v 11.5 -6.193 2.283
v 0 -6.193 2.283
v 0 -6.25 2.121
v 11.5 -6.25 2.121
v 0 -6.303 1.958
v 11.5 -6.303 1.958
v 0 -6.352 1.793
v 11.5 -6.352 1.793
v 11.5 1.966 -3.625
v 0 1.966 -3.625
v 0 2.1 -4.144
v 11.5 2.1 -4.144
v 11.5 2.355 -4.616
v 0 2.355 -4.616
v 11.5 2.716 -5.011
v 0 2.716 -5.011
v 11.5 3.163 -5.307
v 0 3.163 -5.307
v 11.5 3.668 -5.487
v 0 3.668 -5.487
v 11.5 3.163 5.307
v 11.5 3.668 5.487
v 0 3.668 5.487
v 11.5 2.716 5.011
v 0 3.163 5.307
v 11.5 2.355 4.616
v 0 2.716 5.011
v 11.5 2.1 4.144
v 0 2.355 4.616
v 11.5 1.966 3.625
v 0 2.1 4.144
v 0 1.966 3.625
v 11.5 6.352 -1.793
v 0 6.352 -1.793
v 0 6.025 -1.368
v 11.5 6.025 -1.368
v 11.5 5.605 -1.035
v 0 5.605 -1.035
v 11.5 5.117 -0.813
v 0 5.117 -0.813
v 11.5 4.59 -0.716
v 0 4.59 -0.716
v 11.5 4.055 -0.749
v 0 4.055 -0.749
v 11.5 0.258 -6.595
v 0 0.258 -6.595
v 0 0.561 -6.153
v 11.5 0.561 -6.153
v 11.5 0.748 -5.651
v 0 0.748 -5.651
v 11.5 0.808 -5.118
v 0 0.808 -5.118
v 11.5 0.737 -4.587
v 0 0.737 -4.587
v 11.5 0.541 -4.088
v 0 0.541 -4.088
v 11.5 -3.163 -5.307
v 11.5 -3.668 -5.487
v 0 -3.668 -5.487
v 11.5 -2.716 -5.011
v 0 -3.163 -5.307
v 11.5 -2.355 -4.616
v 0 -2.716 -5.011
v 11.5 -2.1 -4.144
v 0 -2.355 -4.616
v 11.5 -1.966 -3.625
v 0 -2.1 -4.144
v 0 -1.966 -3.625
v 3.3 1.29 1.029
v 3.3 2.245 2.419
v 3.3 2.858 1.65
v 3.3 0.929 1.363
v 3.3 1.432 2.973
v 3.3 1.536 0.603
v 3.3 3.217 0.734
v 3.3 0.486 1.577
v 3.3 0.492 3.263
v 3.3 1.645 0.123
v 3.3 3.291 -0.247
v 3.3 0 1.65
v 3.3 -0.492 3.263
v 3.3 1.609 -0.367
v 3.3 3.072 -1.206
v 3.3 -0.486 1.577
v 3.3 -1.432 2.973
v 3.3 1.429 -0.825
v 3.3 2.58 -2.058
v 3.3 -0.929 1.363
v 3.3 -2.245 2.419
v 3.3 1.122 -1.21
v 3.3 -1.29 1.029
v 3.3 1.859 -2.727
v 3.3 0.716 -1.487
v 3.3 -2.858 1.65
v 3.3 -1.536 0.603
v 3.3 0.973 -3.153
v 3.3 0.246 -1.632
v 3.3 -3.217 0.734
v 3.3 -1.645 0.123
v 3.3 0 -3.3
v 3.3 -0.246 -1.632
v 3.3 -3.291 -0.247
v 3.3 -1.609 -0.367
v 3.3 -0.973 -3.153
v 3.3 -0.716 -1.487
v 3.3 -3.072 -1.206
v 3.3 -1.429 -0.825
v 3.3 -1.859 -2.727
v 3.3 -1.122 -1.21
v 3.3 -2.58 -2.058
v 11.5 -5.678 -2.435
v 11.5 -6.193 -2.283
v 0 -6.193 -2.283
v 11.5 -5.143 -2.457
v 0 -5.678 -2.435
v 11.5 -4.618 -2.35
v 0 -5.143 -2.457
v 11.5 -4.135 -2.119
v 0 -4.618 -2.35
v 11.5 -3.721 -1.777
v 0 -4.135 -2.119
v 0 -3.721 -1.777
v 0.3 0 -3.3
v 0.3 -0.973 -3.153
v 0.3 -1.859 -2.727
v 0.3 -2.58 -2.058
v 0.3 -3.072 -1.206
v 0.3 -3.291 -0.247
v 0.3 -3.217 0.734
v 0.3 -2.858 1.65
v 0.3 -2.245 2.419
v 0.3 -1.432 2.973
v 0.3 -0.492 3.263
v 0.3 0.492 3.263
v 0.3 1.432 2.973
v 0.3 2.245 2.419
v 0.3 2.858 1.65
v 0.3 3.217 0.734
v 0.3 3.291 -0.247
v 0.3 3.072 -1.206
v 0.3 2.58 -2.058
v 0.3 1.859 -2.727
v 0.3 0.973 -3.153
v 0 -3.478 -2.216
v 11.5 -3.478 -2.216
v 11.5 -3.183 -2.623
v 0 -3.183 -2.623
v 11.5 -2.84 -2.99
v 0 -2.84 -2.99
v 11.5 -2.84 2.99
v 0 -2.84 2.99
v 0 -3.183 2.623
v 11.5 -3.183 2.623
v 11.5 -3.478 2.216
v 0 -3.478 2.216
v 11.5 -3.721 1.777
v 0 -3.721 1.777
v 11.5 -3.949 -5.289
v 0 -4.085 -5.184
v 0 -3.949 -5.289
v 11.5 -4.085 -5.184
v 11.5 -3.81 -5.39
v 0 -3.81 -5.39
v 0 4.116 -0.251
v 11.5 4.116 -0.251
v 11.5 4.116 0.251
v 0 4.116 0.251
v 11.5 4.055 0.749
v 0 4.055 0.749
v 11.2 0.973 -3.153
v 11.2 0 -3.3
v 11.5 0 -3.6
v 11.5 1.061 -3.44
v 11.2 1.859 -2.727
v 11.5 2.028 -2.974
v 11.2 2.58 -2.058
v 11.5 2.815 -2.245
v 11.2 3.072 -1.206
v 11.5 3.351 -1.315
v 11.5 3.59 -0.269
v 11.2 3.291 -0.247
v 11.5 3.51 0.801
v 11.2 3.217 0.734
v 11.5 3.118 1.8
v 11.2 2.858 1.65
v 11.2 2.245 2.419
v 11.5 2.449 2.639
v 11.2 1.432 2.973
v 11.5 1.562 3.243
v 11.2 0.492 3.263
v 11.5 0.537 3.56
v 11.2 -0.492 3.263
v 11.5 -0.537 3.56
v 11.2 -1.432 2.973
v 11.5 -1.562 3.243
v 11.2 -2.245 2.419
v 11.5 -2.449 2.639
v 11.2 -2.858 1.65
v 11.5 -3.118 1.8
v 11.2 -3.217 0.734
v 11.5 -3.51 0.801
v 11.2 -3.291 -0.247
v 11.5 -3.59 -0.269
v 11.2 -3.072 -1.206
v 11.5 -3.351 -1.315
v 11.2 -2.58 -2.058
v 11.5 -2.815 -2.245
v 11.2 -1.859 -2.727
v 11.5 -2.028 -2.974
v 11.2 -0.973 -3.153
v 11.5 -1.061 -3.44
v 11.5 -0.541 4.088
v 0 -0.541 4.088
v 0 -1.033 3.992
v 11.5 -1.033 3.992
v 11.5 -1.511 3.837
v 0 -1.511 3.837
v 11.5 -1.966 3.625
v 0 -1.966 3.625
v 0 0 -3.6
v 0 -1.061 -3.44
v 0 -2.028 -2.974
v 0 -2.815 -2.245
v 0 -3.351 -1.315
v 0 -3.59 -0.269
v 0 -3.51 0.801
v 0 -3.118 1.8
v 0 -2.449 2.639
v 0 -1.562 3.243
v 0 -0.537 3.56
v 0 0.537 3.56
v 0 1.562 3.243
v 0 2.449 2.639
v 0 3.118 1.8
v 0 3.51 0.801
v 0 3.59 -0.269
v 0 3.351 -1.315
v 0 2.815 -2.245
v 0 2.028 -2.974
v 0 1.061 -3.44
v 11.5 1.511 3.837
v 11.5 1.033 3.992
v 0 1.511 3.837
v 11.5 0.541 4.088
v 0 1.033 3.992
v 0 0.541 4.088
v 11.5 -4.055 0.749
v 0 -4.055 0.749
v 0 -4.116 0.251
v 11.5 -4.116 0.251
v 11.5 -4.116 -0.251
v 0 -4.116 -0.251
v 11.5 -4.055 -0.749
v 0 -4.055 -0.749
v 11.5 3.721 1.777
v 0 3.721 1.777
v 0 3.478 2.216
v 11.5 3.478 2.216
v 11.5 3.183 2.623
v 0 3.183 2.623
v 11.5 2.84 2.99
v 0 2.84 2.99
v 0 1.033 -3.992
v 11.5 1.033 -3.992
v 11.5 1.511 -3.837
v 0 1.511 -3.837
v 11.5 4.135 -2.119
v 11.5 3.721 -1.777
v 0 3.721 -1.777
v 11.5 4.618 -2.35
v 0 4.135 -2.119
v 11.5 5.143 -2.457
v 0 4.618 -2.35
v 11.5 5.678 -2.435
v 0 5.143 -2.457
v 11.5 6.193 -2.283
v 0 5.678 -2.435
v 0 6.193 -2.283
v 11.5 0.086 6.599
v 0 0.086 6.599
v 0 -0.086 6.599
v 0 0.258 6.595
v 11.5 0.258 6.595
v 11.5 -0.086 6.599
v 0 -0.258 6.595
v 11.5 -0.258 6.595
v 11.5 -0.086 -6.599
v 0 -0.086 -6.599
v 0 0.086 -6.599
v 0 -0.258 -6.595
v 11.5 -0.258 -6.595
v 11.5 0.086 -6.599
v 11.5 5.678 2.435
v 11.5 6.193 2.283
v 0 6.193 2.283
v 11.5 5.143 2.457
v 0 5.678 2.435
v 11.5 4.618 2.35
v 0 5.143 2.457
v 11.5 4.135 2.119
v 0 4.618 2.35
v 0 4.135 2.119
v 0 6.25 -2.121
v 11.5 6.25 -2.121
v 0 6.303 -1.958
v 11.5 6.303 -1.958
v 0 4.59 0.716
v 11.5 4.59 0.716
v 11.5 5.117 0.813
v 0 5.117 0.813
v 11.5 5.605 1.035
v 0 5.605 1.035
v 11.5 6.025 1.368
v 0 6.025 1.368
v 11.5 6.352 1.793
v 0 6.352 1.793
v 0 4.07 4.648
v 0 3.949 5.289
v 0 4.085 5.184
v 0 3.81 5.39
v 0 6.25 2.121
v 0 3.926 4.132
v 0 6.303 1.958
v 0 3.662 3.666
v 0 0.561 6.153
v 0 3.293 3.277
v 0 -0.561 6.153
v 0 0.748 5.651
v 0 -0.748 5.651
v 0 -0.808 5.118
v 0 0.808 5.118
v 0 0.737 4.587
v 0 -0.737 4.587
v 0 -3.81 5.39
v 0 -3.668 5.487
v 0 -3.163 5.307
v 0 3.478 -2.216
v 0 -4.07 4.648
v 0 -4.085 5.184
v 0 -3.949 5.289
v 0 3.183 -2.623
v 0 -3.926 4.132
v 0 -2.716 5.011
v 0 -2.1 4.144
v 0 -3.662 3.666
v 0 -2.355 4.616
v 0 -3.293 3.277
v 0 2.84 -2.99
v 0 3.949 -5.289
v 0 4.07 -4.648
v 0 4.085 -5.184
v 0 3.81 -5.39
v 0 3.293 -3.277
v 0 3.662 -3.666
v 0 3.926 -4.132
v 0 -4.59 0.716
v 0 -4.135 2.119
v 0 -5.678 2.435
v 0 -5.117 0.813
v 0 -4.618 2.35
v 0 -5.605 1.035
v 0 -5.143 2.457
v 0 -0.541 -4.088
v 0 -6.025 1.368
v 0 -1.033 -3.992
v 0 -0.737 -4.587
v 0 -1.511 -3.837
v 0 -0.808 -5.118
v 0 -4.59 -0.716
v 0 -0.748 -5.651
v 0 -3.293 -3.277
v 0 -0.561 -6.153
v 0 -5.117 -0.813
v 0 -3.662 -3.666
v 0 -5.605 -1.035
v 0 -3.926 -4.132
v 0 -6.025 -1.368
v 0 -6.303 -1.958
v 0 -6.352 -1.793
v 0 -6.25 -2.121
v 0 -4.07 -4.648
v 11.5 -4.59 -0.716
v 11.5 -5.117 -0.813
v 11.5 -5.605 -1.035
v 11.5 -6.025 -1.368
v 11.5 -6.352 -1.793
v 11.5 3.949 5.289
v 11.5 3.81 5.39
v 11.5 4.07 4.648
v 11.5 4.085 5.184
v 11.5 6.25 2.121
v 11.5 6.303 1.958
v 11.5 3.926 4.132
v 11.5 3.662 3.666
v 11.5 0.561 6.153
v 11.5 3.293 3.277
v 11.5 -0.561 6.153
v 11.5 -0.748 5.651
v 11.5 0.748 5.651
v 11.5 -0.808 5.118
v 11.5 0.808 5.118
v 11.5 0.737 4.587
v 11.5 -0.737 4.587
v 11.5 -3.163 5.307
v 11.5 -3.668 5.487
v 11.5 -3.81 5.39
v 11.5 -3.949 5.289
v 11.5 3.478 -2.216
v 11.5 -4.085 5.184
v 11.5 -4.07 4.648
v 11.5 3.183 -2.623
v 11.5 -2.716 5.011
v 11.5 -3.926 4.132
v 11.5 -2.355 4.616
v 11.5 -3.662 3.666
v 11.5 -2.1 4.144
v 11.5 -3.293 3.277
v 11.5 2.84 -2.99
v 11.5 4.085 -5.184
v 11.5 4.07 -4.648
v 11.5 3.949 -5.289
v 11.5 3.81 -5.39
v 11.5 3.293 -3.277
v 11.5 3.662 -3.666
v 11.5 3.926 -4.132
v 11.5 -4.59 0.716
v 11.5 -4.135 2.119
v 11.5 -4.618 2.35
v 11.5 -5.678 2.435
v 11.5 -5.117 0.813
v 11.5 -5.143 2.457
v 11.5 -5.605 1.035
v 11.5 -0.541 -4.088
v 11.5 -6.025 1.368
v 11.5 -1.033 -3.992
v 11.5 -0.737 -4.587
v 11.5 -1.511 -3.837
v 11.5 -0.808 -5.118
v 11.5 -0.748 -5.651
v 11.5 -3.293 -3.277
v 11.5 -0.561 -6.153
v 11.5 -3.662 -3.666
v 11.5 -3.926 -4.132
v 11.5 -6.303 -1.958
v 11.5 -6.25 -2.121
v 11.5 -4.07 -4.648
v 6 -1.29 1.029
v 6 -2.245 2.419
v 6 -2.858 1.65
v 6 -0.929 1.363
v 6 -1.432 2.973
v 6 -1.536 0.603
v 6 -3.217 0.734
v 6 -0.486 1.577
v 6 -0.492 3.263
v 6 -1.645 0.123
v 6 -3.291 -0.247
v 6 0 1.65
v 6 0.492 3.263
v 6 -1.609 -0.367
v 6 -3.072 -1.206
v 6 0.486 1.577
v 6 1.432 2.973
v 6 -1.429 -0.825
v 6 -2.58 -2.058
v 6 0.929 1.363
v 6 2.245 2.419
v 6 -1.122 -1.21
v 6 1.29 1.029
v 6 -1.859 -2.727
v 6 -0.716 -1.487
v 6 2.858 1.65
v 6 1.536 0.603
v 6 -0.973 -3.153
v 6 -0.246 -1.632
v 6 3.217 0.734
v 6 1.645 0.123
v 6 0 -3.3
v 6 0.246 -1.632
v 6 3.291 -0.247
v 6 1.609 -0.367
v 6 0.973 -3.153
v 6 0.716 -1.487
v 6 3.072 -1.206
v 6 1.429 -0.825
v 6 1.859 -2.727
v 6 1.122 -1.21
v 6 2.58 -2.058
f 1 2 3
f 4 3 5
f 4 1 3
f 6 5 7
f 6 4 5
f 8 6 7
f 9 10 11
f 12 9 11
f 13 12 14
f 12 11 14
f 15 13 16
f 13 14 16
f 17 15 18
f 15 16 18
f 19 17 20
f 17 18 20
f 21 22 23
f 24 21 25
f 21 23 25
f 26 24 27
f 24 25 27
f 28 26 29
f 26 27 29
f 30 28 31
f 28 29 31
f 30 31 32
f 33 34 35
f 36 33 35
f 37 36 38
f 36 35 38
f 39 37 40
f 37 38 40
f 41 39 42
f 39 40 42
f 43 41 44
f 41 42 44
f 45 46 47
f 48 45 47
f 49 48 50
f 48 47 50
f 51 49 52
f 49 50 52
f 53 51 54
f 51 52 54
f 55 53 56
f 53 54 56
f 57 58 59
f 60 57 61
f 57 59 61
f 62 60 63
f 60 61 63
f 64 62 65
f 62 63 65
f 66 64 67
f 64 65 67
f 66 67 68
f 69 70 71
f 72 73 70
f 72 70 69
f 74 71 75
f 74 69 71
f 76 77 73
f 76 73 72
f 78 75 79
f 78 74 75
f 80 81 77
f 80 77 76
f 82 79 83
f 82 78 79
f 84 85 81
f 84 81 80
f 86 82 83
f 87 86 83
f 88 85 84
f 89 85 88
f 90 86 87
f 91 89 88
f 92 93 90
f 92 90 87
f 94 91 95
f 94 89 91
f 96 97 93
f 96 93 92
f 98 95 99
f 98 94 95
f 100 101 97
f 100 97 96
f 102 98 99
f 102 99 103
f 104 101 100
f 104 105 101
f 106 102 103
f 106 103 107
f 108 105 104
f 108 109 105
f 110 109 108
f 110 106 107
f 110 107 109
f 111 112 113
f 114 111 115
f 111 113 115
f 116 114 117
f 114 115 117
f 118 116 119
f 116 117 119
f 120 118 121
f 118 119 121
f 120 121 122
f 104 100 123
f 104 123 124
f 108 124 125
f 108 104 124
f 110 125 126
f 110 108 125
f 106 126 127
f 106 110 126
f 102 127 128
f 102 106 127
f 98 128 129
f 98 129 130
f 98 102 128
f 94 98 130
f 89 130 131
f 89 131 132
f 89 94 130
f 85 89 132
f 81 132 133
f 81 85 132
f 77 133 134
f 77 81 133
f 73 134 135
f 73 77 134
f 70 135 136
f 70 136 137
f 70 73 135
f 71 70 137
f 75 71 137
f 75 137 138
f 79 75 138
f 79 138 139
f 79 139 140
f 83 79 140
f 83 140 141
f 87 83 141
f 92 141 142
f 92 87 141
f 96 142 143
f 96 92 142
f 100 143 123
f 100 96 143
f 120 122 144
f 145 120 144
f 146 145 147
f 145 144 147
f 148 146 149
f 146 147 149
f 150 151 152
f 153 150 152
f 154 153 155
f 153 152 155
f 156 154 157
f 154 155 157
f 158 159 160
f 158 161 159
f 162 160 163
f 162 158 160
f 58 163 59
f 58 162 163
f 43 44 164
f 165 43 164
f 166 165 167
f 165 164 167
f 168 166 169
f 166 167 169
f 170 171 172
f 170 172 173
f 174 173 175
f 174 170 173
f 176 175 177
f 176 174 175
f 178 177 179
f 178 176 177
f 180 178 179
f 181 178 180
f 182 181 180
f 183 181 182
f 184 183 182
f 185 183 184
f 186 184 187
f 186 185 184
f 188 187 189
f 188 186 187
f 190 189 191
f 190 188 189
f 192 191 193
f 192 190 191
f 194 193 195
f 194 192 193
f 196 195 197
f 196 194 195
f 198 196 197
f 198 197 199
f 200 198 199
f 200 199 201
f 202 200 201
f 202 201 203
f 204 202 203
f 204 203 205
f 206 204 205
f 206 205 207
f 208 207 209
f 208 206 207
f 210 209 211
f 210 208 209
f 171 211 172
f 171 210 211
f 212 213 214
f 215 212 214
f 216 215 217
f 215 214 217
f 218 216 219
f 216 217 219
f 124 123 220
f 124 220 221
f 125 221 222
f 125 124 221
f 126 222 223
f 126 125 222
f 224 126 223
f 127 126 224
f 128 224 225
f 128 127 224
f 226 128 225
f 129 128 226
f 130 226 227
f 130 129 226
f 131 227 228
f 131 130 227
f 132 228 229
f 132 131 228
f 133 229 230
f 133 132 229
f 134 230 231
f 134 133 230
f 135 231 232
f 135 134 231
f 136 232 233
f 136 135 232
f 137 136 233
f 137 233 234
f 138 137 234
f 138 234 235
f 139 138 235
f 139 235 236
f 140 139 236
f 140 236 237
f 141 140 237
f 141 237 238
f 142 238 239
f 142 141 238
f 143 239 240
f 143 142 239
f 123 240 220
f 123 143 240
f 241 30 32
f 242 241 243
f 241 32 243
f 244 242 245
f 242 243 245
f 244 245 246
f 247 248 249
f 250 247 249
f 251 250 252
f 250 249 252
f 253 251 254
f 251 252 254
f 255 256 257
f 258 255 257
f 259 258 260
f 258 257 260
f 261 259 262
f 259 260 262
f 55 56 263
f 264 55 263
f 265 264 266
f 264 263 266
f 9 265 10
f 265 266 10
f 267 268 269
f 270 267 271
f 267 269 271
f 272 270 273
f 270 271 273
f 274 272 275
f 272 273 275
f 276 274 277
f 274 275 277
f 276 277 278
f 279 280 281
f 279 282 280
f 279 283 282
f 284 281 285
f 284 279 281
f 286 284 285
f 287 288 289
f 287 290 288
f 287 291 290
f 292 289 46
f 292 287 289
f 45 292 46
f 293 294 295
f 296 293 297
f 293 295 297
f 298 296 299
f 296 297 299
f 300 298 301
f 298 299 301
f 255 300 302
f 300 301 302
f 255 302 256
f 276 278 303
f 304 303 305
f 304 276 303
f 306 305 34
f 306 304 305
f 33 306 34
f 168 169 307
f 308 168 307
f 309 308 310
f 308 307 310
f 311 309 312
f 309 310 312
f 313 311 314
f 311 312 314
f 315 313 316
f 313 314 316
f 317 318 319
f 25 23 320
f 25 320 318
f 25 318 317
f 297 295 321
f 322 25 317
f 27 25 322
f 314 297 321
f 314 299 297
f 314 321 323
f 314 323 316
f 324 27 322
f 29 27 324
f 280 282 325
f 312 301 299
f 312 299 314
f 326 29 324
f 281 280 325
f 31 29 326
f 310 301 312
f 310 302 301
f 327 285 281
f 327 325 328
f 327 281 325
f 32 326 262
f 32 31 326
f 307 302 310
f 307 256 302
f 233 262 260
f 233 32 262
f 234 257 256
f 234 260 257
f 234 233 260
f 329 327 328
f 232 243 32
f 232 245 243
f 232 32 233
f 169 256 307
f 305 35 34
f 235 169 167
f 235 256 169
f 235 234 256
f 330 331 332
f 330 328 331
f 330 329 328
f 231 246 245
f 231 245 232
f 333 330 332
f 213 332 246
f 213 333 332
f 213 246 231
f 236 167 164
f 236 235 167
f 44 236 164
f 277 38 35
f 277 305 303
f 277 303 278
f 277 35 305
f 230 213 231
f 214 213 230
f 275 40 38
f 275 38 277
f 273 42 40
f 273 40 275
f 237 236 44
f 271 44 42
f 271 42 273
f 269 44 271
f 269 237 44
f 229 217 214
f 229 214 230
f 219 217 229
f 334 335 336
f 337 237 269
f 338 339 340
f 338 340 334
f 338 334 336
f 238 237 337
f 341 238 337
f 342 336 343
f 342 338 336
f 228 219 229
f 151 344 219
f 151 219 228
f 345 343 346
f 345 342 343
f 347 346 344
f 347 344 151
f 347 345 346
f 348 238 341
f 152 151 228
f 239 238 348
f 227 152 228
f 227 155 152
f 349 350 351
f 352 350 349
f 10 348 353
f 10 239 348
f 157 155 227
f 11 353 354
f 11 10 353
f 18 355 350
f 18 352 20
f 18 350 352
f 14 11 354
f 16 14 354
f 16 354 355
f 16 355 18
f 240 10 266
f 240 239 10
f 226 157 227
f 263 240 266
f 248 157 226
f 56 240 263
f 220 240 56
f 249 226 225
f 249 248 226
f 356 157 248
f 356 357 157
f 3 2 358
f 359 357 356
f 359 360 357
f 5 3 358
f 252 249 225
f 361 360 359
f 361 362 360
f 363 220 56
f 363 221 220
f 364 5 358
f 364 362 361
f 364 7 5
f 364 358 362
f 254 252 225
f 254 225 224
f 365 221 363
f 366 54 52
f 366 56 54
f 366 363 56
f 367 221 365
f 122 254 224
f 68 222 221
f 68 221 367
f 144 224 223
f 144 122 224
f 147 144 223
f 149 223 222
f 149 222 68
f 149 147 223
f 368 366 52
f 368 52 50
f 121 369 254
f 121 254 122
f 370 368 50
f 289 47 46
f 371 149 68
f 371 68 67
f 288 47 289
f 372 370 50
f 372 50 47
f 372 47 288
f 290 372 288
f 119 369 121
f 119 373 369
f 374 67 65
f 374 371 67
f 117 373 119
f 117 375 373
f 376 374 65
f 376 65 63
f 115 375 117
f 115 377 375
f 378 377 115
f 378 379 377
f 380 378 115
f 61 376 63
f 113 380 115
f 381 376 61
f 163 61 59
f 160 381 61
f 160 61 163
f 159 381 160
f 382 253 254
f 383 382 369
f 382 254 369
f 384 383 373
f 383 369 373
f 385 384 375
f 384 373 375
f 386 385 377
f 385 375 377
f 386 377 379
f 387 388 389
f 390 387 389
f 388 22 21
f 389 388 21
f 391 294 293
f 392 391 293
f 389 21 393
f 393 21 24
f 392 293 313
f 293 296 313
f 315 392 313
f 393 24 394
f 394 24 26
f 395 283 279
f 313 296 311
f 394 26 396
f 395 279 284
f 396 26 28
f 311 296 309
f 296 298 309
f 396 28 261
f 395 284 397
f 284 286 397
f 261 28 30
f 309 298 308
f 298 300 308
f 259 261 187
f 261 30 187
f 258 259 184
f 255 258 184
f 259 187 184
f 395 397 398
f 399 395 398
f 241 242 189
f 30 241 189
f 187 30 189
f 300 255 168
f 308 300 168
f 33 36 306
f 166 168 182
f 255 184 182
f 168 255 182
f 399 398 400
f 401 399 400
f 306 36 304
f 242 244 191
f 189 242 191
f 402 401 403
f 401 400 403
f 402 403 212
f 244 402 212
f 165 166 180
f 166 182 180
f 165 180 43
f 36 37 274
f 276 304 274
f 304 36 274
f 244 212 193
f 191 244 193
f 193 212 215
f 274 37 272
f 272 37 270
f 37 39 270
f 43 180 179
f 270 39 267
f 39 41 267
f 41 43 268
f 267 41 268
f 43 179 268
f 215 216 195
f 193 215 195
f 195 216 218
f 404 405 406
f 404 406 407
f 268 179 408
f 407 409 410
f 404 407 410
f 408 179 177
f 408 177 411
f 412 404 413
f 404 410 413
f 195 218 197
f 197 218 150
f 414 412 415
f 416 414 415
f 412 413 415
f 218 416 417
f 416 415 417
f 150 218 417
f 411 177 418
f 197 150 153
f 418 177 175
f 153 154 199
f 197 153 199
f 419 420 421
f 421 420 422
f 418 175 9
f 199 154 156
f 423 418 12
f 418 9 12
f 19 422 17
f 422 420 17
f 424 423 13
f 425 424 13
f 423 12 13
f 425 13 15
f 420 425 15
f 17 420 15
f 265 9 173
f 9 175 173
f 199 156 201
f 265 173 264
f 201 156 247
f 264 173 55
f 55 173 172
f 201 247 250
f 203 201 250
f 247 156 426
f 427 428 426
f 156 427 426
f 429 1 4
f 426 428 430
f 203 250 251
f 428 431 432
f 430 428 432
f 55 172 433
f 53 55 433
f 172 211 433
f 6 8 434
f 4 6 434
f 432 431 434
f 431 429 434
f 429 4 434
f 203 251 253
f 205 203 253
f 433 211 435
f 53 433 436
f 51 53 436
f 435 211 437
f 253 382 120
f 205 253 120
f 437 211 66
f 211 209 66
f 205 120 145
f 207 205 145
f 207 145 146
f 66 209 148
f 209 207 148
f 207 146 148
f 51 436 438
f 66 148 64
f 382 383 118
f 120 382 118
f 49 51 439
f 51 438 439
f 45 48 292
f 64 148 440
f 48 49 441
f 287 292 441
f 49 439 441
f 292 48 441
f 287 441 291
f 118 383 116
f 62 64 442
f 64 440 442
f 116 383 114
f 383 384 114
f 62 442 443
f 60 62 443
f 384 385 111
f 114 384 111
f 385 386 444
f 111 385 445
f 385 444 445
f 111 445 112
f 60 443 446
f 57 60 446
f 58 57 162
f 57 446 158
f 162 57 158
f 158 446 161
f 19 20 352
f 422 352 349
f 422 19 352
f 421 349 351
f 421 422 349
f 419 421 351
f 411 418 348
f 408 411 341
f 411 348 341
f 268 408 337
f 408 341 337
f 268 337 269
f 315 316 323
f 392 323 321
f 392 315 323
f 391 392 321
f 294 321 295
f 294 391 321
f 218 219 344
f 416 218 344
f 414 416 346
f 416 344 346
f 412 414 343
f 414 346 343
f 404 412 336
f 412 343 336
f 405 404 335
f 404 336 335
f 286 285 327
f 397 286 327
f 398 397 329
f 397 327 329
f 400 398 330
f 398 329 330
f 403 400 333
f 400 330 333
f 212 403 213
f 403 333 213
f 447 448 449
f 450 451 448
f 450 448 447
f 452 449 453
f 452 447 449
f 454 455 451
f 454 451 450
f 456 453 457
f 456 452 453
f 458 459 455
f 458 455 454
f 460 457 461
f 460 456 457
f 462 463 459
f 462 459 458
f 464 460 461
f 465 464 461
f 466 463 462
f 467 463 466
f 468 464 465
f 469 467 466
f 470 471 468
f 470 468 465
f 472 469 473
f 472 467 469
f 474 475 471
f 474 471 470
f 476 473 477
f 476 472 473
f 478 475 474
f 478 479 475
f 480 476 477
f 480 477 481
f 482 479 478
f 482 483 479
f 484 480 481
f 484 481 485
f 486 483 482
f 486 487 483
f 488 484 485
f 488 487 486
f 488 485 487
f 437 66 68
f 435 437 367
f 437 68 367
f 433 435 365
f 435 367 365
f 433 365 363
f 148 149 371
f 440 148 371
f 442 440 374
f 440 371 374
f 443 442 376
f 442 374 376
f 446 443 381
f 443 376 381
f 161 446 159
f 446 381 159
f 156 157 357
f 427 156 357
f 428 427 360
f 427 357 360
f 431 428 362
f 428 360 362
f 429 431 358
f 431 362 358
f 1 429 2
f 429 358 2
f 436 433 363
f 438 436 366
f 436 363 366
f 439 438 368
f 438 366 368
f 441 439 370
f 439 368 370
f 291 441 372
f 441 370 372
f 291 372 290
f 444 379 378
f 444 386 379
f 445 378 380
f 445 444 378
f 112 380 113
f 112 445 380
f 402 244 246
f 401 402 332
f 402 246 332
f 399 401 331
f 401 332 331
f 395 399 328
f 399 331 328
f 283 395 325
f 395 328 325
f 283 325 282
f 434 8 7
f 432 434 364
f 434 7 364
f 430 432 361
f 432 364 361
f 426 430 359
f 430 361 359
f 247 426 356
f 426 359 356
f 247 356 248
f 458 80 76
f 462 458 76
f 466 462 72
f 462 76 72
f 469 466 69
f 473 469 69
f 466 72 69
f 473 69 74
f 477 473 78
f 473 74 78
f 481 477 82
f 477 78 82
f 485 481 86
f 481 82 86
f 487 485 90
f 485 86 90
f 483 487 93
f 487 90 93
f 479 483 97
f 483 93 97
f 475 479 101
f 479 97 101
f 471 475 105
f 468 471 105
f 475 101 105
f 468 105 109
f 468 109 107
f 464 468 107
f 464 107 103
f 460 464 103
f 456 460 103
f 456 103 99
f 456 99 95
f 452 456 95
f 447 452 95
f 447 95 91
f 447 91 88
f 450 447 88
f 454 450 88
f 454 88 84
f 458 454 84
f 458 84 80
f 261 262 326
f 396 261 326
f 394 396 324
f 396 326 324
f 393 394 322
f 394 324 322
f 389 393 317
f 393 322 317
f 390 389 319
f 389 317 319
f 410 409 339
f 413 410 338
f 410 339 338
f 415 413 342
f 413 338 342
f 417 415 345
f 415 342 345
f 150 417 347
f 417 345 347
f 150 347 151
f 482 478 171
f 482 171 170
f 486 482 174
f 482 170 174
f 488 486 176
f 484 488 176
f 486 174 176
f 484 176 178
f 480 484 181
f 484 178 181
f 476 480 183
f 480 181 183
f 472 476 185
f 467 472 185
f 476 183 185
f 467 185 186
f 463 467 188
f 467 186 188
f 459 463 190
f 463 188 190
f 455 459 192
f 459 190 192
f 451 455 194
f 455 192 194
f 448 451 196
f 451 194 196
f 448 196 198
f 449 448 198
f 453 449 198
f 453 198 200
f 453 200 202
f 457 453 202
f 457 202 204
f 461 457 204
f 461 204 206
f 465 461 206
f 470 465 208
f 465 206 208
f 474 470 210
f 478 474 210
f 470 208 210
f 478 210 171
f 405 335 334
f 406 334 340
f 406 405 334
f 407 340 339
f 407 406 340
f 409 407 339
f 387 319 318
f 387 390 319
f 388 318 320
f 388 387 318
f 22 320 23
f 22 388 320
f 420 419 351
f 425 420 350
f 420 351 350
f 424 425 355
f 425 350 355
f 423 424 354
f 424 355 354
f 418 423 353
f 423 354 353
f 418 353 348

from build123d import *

# Parameters (mm, degrees)
BASPROSKE_W        = 11.5
BASPROSKE_H        = 6.6
TOOTHCUT_DEPTH     = 15.811144453
TEETHCUTS_COUNT    = 10
TEETHCUTS_ANGLE    = 324
BORSKE_R           = 1.5
BORE_DEPTH         = 50.0003556
SKETCH2_R          = 3.3
CUT_EXTRUDE1_DEPTH = 5.5
CUT_EXTRUDE2_START = -3.3
SKETCH3_R          = 3.3
CUT_EXTRUDE2_DEPTH = 3.3
SKETCH4_R          = 1.65
CUT_EXTRUDE3_DEPTH = 13.294146319
CHAMFER1_SIZE      = 0.3


with BuildPart() as part:
    # BasProSke → Base-Revolve (revolve)
    with BuildSketch(Plane(origin=(0, 0, 0), x_dir=(1, 0, 0), z_dir=(0, 1, 0)), mode=Mode.PRIVATE) as base_revolve_sk:
        with Locations((5.75, 3.3)):
            Rectangle(BASPROSKE_W, BASPROSKE_H)
    revolve(base_revolve_sk.sketch.rotate(Axis((-10, 0, 0), (1, 0, 0)), 180), axis=Axis((-10, 0, 0), (1, 0, 0)))

    # TooCutSke → ToothCut (cut, through all)
    with BuildSketch(Plane(origin=(0, 0, 0), x_dir=(0, 0, -1), z_dir=(1, 0, 0))):
        with BuildLine():
            ThreePointArc((0.749284073, 4.055360573), (0, 4.124), (-0.749284073, 4.055360573))
            ThreePointArc((-0.749284073, 4.055360573), (-0.916574147, 5.384052291), (-1.823298638, 6.369576692))
            ThreePointArc((-1.823298638, 6.369576692), (0, 6.6254), (1.823298638, 6.369576692))
            ThreePointArc((1.823298638, 6.369576692), (0.916574147, 5.384052291), (0.749284073, 4.055360573))
        make_face()
    toothcut = extrude(amount=TOOTHCUT_DEPTH, mode=Mode.SUBTRACT)

    # TeethCuts: ToothCut ×10 about axis
    teethcuts_axis = Axis((-10, 0, 0), (1, 0, 0))
    for i in range(1, TEETHCUTS_COUNT):
        add(toothcut.rotate(teethcuts_axis, i * TEETHCUTS_ANGLE / (TEETHCUTS_COUNT - 1)), mode=Mode.SUBTRACT)

    # BorSke → Bore (cut, symmetric)
    with BuildSketch(Plane(origin=(0, 0, 0), x_dir=(0, 0, -1), z_dir=(1, 0, 0))):
        with Locations(Location((0, 0, 0), (0, 0, 180))):
            Circle(BORSKE_R)
    extrude(amount=BORE_DEPTH, both=True, mode=Mode.SUBTRACT)

    # Sketch2 → Cut-Extrude1 (cut)
    with BuildSketch(Plane(origin=(11.5, 0, 0), x_dir=(0, 0, -1), z_dir=(1, 0, 0))):
        Circle(SKETCH2_R)
    extrude(amount=-CUT_EXTRUDE1_DEPTH, mode=Mode.SUBTRACT)

    # Sketch3 → Cut-Extrude2 (cut)
    with BuildSketch(Plane.ZY.offset(CUT_EXTRUDE2_START)):
        with Locations(Location((0, 0, 0), (0, 0, 180))):
            Circle(SKETCH3_R)
    extrude(amount=CUT_EXTRUDE2_DEPTH, mode=Mode.SUBTRACT)

    # Sketch4 → Cut-Extrude3 (cut, through all)
    with BuildSketch(Plane.ZY.offset(-3.3)):
        Circle(SKETCH4_R)
    extrude(amount=-CUT_EXTRUDE3_DEPTH, mode=Mode.SUBTRACT)

    # Chamfer1
    chamfer1_edges = [part.edges().sort_by_distance(p)[0] for p in [
        (11.5, 0, 3.3),
        (0, 0, 3.3),
    ]]
    chamfer(chamfer1_edges, length=CHAMFER1_SIZE)


solid = part.part
